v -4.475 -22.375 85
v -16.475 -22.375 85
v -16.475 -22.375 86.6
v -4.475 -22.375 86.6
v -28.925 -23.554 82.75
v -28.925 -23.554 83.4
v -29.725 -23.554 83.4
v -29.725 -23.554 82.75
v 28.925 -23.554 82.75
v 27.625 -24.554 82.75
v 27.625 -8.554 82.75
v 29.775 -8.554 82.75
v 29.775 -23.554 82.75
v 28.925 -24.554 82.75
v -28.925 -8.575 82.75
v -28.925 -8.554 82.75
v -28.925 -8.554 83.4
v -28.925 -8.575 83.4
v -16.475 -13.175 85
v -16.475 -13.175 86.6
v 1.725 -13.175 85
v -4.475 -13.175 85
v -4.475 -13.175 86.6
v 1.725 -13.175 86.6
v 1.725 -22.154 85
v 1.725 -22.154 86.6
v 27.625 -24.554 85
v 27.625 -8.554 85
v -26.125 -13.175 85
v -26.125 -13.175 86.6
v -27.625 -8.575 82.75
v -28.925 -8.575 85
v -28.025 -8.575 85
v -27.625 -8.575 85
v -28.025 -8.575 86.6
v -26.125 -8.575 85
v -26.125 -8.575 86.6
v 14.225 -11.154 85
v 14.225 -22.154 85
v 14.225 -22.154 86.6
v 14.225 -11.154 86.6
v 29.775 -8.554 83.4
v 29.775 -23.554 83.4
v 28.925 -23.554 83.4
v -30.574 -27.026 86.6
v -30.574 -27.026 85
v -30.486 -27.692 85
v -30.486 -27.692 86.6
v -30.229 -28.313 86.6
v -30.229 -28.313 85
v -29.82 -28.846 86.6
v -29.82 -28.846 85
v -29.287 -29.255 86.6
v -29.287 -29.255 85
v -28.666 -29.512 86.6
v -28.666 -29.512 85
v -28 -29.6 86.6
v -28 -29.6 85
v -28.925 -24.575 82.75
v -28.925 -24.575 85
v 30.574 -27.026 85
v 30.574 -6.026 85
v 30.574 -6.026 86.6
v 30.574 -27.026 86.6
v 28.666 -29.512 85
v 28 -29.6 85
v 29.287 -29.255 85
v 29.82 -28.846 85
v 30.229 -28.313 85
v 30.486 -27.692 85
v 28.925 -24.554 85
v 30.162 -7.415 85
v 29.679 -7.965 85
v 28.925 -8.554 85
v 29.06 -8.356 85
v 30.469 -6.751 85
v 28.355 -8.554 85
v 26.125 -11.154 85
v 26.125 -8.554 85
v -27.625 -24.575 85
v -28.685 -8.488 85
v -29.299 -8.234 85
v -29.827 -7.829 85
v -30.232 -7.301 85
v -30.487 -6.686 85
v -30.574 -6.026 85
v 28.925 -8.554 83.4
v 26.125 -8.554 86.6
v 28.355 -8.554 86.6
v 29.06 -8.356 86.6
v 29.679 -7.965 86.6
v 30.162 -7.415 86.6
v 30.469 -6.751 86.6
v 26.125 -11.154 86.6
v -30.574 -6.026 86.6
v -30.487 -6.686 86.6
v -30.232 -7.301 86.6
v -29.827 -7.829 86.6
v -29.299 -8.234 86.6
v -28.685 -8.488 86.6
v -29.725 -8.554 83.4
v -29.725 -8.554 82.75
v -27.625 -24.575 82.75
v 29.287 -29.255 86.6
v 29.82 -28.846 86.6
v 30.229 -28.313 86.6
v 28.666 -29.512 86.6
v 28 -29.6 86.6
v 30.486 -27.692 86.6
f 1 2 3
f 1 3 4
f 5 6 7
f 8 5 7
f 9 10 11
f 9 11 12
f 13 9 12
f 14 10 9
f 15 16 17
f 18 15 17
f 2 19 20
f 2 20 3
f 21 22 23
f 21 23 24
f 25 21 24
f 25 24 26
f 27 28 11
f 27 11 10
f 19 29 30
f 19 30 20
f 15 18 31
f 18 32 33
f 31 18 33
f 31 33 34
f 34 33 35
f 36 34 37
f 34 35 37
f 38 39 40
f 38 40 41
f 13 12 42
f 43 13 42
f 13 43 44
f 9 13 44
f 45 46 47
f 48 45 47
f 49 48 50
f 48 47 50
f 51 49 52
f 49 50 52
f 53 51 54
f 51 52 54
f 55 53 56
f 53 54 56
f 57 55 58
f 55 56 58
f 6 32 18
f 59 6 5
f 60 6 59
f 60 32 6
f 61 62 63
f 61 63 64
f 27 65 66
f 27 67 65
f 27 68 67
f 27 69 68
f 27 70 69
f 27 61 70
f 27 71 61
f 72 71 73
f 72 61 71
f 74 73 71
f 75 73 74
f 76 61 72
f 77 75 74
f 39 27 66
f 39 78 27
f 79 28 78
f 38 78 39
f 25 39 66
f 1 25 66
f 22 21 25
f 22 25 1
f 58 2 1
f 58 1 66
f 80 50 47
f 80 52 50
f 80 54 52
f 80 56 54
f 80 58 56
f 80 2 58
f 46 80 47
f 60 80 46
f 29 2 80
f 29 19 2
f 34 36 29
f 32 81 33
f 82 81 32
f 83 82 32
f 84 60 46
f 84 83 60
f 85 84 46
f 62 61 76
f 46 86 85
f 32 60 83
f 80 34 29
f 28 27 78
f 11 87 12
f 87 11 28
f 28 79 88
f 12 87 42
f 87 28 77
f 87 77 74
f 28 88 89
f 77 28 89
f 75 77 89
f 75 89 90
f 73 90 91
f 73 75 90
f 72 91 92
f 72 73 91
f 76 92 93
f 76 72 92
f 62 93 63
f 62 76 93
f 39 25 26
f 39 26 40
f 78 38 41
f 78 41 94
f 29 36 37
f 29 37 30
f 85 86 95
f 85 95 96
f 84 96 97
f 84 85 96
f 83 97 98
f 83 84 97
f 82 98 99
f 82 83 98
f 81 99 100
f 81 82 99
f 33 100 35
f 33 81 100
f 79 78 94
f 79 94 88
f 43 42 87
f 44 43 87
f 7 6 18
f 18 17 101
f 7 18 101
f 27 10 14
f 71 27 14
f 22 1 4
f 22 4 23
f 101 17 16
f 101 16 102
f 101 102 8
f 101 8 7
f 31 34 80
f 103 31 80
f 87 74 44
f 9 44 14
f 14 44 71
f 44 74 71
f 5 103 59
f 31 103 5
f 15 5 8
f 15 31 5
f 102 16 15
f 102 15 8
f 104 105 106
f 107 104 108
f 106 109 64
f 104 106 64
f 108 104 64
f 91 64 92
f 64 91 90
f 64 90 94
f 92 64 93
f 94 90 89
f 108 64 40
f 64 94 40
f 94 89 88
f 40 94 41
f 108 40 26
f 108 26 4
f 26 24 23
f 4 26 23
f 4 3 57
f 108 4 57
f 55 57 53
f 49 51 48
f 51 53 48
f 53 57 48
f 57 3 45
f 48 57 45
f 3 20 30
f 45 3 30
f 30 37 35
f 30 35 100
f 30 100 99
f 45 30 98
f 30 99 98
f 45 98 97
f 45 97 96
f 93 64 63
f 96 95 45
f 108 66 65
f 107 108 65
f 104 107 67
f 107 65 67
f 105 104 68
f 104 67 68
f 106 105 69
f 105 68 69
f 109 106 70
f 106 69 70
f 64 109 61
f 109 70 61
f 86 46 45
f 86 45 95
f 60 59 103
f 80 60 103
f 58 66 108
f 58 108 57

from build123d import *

# Parameters (mm, degrees)
PAD003_DEPTH  = 1.6
SKETCH011_W   = 1.3
SKETCH011_H   = 16
PAD004_DEPTH  = 2.25
SKETCH012_W   = 0.8
SKETCH012_H   = 0.65
SKETCH012_W_2 = 0.85
PAD005_DEPTH  = 15


with BuildPart() as part:
    # Sketch008 → Pad003 (new body)
    with BuildSketch(Plane.XY.offset(85)):
        with BuildLine():
            Line((30.57387, -6.02613), (30.57387, -27.02613))
            ThreePointArc((28, -29.6), (29.820001, -28.846131), (30.57387, -27.02613))
            Line((28, -29.6), (-28, -29.6))
            ThreePointArc((-30.57387, -27.02613), (-29.820001, -28.846131), (-28, -29.6))
            Line((-30.57387, -27.02613), (-30.57387, -6.02613))
            ThreePointArc((-30.57387, -6.02613), (-29.827263, -7.828603), (-28.02479, -8.575212))
            Line((-28.02479, -8.575212), (-26.12479, -8.575212))
            Line((-26.12479, -8.575212), (-26.12479, -13.175212))
            Line((-26.12479, -13.175212), (-16.47479, -13.175212))
            Line((-16.47479, -13.175212), (-16.47479, -22.375212))
            Line((-16.47479, -22.375212), (-4.47479, -22.375212))
            Line((-4.47479, -22.375212), (-4.47479, -13.175212))
            Line((-4.47479, -13.175212), (1.72521, -13.175212))
            Line((1.72521, -13.175212), (1.72521, -22.153704))
            Line((1.72521, -22.153704), (14.22521, -22.153704))
            Line((14.22521, -22.153704), (14.22521, -11.153704))
            Line((14.22521, -11.153704), (26.12521, -11.153704))
            Line((26.12521, -11.153704), (26.12521, -8.553704))
            Line((26.12521, -8.553704), (28.35521, -8.553704))
            ThreePointArc((28.35521, -8.553704), (29.940524, -7.707728), (30.57387, -6.02613))
        make_face()
    extrude(amount=PAD003_DEPTH)

    # Sketch011 → Pad004 (new body)
    with BuildSketch(Plane(origin=(0, 0, 85), x_dir=(1, 0, 0), z_dir=(0, 0, -1))):
        with Locations((-28.27479, 16.575212)):
            Rectangle(SKETCH011_W, SKETCH011_H)
        with Locations((28.27521, 16.553704)):
            Rectangle(SKETCH011_W, SKETCH011_H)
    extrude(amount=PAD004_DEPTH)

    # Sketch012 → Pad005 (new body)
    with BuildSketch(Plane(origin=(0, -8.553704, 85), x_dir=(-1, 0, 0), z_dir=(0, 1, 0))):
        with Locations((29.32479, -1.925)):
            Rectangle(SKETCH012_W, SKETCH012_H)
        with Locations((-29.35021, -1.925)):
            Rectangle(SKETCH012_W_2, SKETCH012_H)
    extrude(amount=-PAD005_DEPTH)


solid = part.part
